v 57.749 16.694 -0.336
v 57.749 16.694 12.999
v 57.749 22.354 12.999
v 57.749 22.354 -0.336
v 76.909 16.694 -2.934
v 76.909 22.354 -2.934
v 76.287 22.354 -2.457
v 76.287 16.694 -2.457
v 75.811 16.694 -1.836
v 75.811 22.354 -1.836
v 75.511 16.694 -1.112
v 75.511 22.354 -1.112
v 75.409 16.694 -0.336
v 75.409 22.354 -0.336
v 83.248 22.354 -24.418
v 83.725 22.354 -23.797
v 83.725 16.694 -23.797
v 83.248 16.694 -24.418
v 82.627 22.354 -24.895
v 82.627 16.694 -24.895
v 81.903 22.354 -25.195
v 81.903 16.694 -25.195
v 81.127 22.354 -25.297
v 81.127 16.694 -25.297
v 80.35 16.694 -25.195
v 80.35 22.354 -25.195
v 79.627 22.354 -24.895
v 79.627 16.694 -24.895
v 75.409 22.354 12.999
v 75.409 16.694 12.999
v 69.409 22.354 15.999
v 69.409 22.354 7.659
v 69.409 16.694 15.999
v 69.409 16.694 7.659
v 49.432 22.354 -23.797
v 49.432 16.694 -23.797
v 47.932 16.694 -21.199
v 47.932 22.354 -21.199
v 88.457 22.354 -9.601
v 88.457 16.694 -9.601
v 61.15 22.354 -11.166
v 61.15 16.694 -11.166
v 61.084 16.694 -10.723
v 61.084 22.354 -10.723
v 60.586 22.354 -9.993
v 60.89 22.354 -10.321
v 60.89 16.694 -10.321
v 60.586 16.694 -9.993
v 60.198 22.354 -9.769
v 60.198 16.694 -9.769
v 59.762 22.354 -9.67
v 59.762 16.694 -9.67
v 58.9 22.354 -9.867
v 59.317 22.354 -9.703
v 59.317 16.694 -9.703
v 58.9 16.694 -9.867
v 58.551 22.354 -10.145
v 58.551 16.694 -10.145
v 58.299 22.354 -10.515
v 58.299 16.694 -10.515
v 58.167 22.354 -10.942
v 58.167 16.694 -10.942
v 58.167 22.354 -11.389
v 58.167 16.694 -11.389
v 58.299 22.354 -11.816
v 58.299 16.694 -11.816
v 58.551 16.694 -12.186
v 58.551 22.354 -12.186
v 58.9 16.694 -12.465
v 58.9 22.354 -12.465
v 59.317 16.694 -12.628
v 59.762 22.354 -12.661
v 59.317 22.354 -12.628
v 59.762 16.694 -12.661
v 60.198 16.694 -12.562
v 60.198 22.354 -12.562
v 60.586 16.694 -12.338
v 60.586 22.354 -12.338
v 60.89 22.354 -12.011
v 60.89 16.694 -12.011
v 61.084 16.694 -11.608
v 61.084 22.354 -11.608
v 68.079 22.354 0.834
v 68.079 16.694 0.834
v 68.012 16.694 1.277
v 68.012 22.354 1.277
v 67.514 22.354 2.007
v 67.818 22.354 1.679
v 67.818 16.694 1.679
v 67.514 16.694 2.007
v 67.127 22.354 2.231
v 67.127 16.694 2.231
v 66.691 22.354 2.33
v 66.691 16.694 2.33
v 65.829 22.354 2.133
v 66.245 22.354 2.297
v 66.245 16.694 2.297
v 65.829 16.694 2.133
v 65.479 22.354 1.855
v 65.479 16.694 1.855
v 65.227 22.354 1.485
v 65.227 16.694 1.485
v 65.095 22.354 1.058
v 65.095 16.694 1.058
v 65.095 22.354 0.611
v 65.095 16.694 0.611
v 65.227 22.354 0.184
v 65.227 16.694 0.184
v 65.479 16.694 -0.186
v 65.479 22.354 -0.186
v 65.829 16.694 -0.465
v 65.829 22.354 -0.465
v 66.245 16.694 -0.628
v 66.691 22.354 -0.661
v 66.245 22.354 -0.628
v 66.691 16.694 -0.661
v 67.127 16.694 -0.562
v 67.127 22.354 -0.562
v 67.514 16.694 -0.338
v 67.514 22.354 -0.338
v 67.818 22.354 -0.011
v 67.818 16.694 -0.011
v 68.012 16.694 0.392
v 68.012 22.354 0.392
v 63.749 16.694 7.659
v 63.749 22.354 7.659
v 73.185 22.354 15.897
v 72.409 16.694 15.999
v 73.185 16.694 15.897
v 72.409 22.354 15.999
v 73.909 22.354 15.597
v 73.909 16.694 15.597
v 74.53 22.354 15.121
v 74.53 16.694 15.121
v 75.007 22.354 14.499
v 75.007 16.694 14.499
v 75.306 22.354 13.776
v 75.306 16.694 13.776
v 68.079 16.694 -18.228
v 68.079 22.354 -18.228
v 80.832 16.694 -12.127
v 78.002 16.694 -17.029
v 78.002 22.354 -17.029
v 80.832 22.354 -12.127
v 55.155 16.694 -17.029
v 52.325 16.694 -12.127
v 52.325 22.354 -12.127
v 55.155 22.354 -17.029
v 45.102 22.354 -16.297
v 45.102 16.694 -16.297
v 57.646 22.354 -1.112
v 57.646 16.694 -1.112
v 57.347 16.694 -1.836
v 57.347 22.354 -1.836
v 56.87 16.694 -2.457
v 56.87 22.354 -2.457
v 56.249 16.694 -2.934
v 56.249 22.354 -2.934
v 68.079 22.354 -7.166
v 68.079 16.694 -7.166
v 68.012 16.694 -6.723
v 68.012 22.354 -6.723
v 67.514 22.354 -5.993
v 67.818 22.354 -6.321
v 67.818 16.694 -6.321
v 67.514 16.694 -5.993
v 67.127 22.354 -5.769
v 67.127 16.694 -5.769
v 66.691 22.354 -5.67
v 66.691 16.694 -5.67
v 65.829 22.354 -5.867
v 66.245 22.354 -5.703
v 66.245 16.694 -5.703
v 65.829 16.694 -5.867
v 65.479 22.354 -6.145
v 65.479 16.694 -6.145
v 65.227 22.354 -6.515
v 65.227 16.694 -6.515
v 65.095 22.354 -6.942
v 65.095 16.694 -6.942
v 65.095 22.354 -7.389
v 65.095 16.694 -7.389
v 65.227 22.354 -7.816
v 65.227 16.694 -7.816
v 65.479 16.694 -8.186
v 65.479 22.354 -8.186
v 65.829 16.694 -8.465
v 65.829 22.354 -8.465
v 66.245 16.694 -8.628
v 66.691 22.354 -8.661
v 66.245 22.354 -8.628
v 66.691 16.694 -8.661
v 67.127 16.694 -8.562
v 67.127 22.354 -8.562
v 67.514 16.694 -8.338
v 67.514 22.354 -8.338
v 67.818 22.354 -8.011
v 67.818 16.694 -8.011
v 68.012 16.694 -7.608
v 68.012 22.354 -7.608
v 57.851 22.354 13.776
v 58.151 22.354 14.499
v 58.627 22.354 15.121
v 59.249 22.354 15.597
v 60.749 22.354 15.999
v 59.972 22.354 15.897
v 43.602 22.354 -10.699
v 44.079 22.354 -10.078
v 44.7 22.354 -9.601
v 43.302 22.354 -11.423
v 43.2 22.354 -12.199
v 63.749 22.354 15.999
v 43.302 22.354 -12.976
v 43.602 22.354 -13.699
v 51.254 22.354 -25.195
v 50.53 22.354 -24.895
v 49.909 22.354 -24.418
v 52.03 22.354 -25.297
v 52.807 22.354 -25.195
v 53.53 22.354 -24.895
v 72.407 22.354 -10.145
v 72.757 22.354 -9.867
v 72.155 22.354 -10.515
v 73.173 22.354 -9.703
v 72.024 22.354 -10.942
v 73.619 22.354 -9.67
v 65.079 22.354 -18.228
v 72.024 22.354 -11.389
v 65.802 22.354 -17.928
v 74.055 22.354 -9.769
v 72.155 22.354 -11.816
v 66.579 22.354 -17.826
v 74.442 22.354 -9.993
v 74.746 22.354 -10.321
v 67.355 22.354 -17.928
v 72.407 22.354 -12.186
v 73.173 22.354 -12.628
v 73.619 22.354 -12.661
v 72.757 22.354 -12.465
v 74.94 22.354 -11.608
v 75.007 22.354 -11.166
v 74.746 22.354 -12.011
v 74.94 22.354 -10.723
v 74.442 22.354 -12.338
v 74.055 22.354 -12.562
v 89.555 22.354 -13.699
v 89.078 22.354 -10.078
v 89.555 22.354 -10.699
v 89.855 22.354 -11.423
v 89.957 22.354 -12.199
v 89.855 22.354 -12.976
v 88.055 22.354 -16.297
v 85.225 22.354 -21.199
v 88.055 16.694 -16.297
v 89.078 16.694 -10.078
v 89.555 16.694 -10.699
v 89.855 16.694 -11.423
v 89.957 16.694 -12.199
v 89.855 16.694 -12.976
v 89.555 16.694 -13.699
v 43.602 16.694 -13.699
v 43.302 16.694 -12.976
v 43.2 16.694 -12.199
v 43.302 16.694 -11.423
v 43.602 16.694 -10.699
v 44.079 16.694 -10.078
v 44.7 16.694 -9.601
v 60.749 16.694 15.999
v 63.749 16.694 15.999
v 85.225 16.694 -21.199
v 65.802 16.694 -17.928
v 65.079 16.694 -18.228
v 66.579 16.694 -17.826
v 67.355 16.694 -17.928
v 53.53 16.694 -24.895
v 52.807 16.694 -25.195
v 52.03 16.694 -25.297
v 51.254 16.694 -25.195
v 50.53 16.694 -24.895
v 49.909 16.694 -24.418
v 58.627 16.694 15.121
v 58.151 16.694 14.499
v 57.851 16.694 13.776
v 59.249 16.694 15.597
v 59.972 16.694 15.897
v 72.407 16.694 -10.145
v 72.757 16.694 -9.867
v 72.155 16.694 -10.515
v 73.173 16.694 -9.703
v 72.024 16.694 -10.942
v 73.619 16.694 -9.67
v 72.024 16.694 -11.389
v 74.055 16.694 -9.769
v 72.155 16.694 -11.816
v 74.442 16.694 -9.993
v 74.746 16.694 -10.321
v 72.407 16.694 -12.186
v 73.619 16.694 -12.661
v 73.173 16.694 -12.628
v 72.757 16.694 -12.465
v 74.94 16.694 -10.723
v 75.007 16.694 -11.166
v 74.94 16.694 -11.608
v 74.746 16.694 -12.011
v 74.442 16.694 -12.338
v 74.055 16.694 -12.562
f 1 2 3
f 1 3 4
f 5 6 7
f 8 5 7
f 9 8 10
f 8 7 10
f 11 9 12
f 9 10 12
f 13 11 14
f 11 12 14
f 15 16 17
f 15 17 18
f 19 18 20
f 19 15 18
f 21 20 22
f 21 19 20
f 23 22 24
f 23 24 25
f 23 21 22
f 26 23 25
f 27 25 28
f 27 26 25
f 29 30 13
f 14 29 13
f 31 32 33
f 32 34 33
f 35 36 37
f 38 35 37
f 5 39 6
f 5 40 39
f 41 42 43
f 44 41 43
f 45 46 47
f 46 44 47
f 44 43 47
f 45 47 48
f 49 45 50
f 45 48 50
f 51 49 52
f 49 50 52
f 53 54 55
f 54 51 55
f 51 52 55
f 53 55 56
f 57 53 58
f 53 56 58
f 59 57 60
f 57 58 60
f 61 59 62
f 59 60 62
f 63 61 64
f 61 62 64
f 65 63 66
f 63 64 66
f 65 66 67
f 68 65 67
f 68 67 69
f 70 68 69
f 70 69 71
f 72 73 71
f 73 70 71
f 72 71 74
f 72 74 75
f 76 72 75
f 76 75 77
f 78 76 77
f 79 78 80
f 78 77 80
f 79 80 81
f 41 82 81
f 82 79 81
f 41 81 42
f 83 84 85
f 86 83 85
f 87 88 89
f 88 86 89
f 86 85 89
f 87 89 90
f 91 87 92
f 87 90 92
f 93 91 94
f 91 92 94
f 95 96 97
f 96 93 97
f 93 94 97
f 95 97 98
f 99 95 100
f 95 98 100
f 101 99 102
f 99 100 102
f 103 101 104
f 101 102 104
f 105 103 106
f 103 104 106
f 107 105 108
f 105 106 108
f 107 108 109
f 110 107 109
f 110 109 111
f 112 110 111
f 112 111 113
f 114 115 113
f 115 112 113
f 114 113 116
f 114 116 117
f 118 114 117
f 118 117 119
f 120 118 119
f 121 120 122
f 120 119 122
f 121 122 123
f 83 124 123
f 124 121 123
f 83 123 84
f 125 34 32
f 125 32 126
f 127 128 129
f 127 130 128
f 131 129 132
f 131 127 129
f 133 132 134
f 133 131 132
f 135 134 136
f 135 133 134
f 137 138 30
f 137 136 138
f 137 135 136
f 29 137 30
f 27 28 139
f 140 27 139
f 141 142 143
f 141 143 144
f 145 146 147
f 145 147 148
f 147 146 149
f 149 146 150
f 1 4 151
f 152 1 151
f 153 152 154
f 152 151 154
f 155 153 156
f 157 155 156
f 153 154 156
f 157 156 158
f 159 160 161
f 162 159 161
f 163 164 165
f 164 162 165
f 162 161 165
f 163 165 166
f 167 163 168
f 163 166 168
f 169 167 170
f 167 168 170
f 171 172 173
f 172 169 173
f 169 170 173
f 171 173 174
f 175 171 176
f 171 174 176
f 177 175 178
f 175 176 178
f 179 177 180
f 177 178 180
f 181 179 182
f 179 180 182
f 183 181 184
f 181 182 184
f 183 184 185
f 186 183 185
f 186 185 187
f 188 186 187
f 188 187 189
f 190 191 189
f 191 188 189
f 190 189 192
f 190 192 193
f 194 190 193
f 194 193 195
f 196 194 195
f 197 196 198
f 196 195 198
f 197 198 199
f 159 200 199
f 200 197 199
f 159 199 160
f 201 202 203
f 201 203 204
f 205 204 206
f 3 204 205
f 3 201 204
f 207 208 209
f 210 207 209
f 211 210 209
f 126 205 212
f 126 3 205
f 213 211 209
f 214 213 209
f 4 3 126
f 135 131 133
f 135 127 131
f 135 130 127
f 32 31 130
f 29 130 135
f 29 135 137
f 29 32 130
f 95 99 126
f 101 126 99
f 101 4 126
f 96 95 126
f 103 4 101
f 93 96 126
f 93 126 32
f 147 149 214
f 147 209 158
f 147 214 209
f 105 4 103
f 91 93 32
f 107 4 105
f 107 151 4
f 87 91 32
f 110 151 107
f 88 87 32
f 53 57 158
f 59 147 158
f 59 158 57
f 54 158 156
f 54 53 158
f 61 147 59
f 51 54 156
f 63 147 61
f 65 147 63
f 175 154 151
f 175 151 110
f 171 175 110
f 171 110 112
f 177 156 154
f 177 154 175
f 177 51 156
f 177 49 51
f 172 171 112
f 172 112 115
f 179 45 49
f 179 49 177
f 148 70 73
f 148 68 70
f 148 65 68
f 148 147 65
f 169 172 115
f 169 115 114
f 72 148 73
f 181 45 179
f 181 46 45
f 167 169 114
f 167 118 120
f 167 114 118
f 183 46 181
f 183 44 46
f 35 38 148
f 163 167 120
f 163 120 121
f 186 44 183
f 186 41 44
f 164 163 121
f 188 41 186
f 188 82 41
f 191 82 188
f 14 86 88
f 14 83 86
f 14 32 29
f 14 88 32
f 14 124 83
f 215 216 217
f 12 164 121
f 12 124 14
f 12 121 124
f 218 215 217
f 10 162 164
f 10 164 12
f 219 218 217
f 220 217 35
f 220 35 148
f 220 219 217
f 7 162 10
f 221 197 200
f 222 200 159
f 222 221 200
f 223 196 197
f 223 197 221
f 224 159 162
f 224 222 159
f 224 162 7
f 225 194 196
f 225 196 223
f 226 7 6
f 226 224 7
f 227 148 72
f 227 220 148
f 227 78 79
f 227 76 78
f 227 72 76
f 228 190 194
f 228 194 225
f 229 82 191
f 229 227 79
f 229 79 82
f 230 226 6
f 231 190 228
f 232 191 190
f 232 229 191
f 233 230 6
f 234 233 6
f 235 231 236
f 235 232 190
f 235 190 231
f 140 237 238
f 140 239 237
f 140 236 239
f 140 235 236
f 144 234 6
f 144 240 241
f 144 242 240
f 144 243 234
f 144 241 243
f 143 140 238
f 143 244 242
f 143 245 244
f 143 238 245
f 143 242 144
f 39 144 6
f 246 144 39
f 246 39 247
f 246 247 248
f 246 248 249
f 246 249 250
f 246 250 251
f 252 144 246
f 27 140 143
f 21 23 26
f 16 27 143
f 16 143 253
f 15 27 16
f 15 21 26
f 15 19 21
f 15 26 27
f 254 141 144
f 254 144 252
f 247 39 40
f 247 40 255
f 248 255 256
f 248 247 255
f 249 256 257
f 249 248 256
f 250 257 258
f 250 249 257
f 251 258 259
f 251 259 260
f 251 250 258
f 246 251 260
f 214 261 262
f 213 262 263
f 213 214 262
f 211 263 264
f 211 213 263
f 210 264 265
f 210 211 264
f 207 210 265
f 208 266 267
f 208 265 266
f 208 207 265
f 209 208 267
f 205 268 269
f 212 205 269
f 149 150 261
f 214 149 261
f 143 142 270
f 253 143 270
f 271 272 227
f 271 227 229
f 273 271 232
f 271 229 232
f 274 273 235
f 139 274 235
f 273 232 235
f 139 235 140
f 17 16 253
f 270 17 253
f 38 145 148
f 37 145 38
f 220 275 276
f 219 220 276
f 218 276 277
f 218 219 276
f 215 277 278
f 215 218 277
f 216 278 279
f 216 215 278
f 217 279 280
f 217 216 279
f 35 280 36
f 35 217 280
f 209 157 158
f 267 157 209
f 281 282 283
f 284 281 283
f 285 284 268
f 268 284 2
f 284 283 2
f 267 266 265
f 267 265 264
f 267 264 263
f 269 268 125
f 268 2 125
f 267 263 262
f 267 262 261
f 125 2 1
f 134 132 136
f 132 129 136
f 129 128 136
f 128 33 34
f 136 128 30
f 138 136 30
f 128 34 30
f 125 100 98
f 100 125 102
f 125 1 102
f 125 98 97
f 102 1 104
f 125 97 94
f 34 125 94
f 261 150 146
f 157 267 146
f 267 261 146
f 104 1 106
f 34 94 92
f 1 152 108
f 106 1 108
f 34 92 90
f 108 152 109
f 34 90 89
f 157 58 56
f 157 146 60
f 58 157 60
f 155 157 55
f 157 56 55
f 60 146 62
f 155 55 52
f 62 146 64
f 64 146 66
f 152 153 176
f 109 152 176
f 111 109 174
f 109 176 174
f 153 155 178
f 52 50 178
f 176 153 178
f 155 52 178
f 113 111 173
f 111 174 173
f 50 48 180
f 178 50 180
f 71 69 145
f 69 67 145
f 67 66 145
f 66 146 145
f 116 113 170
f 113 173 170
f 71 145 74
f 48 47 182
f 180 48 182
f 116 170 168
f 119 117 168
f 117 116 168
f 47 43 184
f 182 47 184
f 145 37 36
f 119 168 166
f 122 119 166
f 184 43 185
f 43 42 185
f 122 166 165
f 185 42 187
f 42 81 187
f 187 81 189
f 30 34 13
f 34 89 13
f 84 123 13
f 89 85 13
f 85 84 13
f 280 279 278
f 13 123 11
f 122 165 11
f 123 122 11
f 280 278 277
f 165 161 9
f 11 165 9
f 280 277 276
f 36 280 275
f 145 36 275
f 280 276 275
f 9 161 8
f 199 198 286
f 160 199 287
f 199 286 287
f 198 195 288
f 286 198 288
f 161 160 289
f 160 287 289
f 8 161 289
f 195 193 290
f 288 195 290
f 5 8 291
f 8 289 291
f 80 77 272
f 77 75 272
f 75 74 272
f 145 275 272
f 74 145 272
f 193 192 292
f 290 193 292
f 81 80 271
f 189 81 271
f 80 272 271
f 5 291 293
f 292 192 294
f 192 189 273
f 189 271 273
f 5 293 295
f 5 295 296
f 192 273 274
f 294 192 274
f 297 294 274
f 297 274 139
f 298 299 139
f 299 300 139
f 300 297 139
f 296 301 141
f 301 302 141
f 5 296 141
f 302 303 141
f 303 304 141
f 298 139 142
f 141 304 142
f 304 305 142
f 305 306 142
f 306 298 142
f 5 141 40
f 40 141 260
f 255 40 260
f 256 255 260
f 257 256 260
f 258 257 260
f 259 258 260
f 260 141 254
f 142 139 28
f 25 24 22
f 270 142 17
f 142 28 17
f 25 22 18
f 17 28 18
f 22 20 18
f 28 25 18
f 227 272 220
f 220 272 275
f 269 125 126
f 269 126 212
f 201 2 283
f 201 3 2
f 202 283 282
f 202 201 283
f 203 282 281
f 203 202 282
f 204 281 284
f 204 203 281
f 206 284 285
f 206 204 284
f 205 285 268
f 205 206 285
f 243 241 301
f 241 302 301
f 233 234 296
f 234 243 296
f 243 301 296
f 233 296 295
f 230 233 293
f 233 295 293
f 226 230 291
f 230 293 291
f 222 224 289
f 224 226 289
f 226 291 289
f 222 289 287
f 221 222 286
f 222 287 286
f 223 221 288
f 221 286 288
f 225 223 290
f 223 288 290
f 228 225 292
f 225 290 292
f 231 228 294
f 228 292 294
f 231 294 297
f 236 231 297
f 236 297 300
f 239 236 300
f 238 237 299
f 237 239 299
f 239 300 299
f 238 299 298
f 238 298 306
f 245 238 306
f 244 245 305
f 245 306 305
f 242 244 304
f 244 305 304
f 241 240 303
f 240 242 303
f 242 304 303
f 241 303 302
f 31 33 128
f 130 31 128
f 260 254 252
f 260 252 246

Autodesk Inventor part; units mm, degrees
ref_plane "YZ Plane" through (0, 0, 0) normal (1, 0, 0) x (0, 1, 0)
ref_plane "XZ Plane" through (0, 0, 0) normal (0, 1, 0) x (-1, 0, 0)
ref_plane "XY Plane" through (0, 0, 0) normal (0, 0, 1) x (1, 0, 0)
ref_plane "Work Plane1" through (64.8465, 16.6938, -6.1656) normal (0, 1, 0) x (1, 0, 0)
sketch "Sketch1" plane through (64.8465, 16.6938, -6.1656) normal (0, 1, 0) x (1, 0, 0)
  line L0 (1.7321, 1) -> (27.6872, 15.9852) construction
  line L1 (13.1559, 10.8634) -> (20.3785, 15.0334)
  line L2 (15.9859, 5.9616) -> (23.2085, 10.1316)
  line L3 (13.1559, 10.8634) -> (15.9859, 5.9616)
  circle A0 centre (1.7321, 1) radius 20 construction
  circle A1 centre (19.0526, 11) radius 5.175 construction
  circle A2 centre (1.7321, 1) radius 1.5
  line L4 (1.7321, 1) -> (8.6603, 5) construction
  circle A3 centre (8.6603, 5) radius 1.5
  line L5 (17.3785, 20.2295) -> (1.7321, 11.196)
  line L6 (1.7321, 11.196) -> (-13.9144, 20.2295)
  line L7 (26.2085, 4.9355) -> (10.5621, -4.098)
  circle A4 centre (1.7321, 1) radius 10.196 construction
  line L8 (-12.5218, 5.9616) -> (-19.7444, 10.1316)
  line L9 (-9.6918, 10.8634) -> (-16.9144, 15.0334)
  line L10 (-12.5218, 5.9616) -> (-9.6918, 10.8634)
  circle A5 centre (-5.1962, 5) radius 1.5
  line L11 (4.5621, -13.825) -> (4.5621, -22.165)
  line L12 (-1.0979, -13.825) -> (-1.0979, -22.165)
  line L13 (4.5621, -13.825) -> (-1.0979, -13.825)
  circle A6 centre (1.7321, -7) radius 1.5
  line L14 (-7.0979, -22.165) -> (-7.0979, -4.098)
  line L15 (10.5621, -22.165) -> (10.5621, -4.098)
  line L16 (-7.0979, -4.098) -> (-22.7444, 4.9355)
  line L17 (-7.0979, -22.165) -> (-1.0979, -22.165)
  line L18 (4.5621, -22.165) -> (10.5621, -22.165)
  line L19 (-13.9144, 20.2295) -> (-16.9144, 15.0334)
  line L20 (-19.7444, 10.1316) -> (-22.7444, 4.9355)
  line L21 (17.3785, 20.2295) -> (20.3785, 15.0334)
  line L22 (23.2085, 10.1316) -> (26.2085, 4.9355)
  dimension "d34" = 40
  dimension "d35" = 10.35
  dimension "d45" = 3
  dimension "d47" = 8
  dimension "d48" = 3
  dimension "d54" = 360
extrude "Extrusion2" add sketch "Sketch1" along normal blind 5.66
fillet "Fillet1" radius 3 3 edges at (75.4086, 19.5238, -2.0676) (66.5786, 19.5238, -17.3616) (57.7486, 19.5238, -2.0676)
fillet "Fillet2" radius 3 2 edges at (91.055, 19.5238, -11.1011) (82.225, 19.5238, -26.3951)
pattern_circular "Circular Pattern1" count 3 over 360 about axis through (66.5786, 16.6938, -7.1656) along (0, 1, 0) of "Fillet2"
properties part number "Lower PlatformV"
